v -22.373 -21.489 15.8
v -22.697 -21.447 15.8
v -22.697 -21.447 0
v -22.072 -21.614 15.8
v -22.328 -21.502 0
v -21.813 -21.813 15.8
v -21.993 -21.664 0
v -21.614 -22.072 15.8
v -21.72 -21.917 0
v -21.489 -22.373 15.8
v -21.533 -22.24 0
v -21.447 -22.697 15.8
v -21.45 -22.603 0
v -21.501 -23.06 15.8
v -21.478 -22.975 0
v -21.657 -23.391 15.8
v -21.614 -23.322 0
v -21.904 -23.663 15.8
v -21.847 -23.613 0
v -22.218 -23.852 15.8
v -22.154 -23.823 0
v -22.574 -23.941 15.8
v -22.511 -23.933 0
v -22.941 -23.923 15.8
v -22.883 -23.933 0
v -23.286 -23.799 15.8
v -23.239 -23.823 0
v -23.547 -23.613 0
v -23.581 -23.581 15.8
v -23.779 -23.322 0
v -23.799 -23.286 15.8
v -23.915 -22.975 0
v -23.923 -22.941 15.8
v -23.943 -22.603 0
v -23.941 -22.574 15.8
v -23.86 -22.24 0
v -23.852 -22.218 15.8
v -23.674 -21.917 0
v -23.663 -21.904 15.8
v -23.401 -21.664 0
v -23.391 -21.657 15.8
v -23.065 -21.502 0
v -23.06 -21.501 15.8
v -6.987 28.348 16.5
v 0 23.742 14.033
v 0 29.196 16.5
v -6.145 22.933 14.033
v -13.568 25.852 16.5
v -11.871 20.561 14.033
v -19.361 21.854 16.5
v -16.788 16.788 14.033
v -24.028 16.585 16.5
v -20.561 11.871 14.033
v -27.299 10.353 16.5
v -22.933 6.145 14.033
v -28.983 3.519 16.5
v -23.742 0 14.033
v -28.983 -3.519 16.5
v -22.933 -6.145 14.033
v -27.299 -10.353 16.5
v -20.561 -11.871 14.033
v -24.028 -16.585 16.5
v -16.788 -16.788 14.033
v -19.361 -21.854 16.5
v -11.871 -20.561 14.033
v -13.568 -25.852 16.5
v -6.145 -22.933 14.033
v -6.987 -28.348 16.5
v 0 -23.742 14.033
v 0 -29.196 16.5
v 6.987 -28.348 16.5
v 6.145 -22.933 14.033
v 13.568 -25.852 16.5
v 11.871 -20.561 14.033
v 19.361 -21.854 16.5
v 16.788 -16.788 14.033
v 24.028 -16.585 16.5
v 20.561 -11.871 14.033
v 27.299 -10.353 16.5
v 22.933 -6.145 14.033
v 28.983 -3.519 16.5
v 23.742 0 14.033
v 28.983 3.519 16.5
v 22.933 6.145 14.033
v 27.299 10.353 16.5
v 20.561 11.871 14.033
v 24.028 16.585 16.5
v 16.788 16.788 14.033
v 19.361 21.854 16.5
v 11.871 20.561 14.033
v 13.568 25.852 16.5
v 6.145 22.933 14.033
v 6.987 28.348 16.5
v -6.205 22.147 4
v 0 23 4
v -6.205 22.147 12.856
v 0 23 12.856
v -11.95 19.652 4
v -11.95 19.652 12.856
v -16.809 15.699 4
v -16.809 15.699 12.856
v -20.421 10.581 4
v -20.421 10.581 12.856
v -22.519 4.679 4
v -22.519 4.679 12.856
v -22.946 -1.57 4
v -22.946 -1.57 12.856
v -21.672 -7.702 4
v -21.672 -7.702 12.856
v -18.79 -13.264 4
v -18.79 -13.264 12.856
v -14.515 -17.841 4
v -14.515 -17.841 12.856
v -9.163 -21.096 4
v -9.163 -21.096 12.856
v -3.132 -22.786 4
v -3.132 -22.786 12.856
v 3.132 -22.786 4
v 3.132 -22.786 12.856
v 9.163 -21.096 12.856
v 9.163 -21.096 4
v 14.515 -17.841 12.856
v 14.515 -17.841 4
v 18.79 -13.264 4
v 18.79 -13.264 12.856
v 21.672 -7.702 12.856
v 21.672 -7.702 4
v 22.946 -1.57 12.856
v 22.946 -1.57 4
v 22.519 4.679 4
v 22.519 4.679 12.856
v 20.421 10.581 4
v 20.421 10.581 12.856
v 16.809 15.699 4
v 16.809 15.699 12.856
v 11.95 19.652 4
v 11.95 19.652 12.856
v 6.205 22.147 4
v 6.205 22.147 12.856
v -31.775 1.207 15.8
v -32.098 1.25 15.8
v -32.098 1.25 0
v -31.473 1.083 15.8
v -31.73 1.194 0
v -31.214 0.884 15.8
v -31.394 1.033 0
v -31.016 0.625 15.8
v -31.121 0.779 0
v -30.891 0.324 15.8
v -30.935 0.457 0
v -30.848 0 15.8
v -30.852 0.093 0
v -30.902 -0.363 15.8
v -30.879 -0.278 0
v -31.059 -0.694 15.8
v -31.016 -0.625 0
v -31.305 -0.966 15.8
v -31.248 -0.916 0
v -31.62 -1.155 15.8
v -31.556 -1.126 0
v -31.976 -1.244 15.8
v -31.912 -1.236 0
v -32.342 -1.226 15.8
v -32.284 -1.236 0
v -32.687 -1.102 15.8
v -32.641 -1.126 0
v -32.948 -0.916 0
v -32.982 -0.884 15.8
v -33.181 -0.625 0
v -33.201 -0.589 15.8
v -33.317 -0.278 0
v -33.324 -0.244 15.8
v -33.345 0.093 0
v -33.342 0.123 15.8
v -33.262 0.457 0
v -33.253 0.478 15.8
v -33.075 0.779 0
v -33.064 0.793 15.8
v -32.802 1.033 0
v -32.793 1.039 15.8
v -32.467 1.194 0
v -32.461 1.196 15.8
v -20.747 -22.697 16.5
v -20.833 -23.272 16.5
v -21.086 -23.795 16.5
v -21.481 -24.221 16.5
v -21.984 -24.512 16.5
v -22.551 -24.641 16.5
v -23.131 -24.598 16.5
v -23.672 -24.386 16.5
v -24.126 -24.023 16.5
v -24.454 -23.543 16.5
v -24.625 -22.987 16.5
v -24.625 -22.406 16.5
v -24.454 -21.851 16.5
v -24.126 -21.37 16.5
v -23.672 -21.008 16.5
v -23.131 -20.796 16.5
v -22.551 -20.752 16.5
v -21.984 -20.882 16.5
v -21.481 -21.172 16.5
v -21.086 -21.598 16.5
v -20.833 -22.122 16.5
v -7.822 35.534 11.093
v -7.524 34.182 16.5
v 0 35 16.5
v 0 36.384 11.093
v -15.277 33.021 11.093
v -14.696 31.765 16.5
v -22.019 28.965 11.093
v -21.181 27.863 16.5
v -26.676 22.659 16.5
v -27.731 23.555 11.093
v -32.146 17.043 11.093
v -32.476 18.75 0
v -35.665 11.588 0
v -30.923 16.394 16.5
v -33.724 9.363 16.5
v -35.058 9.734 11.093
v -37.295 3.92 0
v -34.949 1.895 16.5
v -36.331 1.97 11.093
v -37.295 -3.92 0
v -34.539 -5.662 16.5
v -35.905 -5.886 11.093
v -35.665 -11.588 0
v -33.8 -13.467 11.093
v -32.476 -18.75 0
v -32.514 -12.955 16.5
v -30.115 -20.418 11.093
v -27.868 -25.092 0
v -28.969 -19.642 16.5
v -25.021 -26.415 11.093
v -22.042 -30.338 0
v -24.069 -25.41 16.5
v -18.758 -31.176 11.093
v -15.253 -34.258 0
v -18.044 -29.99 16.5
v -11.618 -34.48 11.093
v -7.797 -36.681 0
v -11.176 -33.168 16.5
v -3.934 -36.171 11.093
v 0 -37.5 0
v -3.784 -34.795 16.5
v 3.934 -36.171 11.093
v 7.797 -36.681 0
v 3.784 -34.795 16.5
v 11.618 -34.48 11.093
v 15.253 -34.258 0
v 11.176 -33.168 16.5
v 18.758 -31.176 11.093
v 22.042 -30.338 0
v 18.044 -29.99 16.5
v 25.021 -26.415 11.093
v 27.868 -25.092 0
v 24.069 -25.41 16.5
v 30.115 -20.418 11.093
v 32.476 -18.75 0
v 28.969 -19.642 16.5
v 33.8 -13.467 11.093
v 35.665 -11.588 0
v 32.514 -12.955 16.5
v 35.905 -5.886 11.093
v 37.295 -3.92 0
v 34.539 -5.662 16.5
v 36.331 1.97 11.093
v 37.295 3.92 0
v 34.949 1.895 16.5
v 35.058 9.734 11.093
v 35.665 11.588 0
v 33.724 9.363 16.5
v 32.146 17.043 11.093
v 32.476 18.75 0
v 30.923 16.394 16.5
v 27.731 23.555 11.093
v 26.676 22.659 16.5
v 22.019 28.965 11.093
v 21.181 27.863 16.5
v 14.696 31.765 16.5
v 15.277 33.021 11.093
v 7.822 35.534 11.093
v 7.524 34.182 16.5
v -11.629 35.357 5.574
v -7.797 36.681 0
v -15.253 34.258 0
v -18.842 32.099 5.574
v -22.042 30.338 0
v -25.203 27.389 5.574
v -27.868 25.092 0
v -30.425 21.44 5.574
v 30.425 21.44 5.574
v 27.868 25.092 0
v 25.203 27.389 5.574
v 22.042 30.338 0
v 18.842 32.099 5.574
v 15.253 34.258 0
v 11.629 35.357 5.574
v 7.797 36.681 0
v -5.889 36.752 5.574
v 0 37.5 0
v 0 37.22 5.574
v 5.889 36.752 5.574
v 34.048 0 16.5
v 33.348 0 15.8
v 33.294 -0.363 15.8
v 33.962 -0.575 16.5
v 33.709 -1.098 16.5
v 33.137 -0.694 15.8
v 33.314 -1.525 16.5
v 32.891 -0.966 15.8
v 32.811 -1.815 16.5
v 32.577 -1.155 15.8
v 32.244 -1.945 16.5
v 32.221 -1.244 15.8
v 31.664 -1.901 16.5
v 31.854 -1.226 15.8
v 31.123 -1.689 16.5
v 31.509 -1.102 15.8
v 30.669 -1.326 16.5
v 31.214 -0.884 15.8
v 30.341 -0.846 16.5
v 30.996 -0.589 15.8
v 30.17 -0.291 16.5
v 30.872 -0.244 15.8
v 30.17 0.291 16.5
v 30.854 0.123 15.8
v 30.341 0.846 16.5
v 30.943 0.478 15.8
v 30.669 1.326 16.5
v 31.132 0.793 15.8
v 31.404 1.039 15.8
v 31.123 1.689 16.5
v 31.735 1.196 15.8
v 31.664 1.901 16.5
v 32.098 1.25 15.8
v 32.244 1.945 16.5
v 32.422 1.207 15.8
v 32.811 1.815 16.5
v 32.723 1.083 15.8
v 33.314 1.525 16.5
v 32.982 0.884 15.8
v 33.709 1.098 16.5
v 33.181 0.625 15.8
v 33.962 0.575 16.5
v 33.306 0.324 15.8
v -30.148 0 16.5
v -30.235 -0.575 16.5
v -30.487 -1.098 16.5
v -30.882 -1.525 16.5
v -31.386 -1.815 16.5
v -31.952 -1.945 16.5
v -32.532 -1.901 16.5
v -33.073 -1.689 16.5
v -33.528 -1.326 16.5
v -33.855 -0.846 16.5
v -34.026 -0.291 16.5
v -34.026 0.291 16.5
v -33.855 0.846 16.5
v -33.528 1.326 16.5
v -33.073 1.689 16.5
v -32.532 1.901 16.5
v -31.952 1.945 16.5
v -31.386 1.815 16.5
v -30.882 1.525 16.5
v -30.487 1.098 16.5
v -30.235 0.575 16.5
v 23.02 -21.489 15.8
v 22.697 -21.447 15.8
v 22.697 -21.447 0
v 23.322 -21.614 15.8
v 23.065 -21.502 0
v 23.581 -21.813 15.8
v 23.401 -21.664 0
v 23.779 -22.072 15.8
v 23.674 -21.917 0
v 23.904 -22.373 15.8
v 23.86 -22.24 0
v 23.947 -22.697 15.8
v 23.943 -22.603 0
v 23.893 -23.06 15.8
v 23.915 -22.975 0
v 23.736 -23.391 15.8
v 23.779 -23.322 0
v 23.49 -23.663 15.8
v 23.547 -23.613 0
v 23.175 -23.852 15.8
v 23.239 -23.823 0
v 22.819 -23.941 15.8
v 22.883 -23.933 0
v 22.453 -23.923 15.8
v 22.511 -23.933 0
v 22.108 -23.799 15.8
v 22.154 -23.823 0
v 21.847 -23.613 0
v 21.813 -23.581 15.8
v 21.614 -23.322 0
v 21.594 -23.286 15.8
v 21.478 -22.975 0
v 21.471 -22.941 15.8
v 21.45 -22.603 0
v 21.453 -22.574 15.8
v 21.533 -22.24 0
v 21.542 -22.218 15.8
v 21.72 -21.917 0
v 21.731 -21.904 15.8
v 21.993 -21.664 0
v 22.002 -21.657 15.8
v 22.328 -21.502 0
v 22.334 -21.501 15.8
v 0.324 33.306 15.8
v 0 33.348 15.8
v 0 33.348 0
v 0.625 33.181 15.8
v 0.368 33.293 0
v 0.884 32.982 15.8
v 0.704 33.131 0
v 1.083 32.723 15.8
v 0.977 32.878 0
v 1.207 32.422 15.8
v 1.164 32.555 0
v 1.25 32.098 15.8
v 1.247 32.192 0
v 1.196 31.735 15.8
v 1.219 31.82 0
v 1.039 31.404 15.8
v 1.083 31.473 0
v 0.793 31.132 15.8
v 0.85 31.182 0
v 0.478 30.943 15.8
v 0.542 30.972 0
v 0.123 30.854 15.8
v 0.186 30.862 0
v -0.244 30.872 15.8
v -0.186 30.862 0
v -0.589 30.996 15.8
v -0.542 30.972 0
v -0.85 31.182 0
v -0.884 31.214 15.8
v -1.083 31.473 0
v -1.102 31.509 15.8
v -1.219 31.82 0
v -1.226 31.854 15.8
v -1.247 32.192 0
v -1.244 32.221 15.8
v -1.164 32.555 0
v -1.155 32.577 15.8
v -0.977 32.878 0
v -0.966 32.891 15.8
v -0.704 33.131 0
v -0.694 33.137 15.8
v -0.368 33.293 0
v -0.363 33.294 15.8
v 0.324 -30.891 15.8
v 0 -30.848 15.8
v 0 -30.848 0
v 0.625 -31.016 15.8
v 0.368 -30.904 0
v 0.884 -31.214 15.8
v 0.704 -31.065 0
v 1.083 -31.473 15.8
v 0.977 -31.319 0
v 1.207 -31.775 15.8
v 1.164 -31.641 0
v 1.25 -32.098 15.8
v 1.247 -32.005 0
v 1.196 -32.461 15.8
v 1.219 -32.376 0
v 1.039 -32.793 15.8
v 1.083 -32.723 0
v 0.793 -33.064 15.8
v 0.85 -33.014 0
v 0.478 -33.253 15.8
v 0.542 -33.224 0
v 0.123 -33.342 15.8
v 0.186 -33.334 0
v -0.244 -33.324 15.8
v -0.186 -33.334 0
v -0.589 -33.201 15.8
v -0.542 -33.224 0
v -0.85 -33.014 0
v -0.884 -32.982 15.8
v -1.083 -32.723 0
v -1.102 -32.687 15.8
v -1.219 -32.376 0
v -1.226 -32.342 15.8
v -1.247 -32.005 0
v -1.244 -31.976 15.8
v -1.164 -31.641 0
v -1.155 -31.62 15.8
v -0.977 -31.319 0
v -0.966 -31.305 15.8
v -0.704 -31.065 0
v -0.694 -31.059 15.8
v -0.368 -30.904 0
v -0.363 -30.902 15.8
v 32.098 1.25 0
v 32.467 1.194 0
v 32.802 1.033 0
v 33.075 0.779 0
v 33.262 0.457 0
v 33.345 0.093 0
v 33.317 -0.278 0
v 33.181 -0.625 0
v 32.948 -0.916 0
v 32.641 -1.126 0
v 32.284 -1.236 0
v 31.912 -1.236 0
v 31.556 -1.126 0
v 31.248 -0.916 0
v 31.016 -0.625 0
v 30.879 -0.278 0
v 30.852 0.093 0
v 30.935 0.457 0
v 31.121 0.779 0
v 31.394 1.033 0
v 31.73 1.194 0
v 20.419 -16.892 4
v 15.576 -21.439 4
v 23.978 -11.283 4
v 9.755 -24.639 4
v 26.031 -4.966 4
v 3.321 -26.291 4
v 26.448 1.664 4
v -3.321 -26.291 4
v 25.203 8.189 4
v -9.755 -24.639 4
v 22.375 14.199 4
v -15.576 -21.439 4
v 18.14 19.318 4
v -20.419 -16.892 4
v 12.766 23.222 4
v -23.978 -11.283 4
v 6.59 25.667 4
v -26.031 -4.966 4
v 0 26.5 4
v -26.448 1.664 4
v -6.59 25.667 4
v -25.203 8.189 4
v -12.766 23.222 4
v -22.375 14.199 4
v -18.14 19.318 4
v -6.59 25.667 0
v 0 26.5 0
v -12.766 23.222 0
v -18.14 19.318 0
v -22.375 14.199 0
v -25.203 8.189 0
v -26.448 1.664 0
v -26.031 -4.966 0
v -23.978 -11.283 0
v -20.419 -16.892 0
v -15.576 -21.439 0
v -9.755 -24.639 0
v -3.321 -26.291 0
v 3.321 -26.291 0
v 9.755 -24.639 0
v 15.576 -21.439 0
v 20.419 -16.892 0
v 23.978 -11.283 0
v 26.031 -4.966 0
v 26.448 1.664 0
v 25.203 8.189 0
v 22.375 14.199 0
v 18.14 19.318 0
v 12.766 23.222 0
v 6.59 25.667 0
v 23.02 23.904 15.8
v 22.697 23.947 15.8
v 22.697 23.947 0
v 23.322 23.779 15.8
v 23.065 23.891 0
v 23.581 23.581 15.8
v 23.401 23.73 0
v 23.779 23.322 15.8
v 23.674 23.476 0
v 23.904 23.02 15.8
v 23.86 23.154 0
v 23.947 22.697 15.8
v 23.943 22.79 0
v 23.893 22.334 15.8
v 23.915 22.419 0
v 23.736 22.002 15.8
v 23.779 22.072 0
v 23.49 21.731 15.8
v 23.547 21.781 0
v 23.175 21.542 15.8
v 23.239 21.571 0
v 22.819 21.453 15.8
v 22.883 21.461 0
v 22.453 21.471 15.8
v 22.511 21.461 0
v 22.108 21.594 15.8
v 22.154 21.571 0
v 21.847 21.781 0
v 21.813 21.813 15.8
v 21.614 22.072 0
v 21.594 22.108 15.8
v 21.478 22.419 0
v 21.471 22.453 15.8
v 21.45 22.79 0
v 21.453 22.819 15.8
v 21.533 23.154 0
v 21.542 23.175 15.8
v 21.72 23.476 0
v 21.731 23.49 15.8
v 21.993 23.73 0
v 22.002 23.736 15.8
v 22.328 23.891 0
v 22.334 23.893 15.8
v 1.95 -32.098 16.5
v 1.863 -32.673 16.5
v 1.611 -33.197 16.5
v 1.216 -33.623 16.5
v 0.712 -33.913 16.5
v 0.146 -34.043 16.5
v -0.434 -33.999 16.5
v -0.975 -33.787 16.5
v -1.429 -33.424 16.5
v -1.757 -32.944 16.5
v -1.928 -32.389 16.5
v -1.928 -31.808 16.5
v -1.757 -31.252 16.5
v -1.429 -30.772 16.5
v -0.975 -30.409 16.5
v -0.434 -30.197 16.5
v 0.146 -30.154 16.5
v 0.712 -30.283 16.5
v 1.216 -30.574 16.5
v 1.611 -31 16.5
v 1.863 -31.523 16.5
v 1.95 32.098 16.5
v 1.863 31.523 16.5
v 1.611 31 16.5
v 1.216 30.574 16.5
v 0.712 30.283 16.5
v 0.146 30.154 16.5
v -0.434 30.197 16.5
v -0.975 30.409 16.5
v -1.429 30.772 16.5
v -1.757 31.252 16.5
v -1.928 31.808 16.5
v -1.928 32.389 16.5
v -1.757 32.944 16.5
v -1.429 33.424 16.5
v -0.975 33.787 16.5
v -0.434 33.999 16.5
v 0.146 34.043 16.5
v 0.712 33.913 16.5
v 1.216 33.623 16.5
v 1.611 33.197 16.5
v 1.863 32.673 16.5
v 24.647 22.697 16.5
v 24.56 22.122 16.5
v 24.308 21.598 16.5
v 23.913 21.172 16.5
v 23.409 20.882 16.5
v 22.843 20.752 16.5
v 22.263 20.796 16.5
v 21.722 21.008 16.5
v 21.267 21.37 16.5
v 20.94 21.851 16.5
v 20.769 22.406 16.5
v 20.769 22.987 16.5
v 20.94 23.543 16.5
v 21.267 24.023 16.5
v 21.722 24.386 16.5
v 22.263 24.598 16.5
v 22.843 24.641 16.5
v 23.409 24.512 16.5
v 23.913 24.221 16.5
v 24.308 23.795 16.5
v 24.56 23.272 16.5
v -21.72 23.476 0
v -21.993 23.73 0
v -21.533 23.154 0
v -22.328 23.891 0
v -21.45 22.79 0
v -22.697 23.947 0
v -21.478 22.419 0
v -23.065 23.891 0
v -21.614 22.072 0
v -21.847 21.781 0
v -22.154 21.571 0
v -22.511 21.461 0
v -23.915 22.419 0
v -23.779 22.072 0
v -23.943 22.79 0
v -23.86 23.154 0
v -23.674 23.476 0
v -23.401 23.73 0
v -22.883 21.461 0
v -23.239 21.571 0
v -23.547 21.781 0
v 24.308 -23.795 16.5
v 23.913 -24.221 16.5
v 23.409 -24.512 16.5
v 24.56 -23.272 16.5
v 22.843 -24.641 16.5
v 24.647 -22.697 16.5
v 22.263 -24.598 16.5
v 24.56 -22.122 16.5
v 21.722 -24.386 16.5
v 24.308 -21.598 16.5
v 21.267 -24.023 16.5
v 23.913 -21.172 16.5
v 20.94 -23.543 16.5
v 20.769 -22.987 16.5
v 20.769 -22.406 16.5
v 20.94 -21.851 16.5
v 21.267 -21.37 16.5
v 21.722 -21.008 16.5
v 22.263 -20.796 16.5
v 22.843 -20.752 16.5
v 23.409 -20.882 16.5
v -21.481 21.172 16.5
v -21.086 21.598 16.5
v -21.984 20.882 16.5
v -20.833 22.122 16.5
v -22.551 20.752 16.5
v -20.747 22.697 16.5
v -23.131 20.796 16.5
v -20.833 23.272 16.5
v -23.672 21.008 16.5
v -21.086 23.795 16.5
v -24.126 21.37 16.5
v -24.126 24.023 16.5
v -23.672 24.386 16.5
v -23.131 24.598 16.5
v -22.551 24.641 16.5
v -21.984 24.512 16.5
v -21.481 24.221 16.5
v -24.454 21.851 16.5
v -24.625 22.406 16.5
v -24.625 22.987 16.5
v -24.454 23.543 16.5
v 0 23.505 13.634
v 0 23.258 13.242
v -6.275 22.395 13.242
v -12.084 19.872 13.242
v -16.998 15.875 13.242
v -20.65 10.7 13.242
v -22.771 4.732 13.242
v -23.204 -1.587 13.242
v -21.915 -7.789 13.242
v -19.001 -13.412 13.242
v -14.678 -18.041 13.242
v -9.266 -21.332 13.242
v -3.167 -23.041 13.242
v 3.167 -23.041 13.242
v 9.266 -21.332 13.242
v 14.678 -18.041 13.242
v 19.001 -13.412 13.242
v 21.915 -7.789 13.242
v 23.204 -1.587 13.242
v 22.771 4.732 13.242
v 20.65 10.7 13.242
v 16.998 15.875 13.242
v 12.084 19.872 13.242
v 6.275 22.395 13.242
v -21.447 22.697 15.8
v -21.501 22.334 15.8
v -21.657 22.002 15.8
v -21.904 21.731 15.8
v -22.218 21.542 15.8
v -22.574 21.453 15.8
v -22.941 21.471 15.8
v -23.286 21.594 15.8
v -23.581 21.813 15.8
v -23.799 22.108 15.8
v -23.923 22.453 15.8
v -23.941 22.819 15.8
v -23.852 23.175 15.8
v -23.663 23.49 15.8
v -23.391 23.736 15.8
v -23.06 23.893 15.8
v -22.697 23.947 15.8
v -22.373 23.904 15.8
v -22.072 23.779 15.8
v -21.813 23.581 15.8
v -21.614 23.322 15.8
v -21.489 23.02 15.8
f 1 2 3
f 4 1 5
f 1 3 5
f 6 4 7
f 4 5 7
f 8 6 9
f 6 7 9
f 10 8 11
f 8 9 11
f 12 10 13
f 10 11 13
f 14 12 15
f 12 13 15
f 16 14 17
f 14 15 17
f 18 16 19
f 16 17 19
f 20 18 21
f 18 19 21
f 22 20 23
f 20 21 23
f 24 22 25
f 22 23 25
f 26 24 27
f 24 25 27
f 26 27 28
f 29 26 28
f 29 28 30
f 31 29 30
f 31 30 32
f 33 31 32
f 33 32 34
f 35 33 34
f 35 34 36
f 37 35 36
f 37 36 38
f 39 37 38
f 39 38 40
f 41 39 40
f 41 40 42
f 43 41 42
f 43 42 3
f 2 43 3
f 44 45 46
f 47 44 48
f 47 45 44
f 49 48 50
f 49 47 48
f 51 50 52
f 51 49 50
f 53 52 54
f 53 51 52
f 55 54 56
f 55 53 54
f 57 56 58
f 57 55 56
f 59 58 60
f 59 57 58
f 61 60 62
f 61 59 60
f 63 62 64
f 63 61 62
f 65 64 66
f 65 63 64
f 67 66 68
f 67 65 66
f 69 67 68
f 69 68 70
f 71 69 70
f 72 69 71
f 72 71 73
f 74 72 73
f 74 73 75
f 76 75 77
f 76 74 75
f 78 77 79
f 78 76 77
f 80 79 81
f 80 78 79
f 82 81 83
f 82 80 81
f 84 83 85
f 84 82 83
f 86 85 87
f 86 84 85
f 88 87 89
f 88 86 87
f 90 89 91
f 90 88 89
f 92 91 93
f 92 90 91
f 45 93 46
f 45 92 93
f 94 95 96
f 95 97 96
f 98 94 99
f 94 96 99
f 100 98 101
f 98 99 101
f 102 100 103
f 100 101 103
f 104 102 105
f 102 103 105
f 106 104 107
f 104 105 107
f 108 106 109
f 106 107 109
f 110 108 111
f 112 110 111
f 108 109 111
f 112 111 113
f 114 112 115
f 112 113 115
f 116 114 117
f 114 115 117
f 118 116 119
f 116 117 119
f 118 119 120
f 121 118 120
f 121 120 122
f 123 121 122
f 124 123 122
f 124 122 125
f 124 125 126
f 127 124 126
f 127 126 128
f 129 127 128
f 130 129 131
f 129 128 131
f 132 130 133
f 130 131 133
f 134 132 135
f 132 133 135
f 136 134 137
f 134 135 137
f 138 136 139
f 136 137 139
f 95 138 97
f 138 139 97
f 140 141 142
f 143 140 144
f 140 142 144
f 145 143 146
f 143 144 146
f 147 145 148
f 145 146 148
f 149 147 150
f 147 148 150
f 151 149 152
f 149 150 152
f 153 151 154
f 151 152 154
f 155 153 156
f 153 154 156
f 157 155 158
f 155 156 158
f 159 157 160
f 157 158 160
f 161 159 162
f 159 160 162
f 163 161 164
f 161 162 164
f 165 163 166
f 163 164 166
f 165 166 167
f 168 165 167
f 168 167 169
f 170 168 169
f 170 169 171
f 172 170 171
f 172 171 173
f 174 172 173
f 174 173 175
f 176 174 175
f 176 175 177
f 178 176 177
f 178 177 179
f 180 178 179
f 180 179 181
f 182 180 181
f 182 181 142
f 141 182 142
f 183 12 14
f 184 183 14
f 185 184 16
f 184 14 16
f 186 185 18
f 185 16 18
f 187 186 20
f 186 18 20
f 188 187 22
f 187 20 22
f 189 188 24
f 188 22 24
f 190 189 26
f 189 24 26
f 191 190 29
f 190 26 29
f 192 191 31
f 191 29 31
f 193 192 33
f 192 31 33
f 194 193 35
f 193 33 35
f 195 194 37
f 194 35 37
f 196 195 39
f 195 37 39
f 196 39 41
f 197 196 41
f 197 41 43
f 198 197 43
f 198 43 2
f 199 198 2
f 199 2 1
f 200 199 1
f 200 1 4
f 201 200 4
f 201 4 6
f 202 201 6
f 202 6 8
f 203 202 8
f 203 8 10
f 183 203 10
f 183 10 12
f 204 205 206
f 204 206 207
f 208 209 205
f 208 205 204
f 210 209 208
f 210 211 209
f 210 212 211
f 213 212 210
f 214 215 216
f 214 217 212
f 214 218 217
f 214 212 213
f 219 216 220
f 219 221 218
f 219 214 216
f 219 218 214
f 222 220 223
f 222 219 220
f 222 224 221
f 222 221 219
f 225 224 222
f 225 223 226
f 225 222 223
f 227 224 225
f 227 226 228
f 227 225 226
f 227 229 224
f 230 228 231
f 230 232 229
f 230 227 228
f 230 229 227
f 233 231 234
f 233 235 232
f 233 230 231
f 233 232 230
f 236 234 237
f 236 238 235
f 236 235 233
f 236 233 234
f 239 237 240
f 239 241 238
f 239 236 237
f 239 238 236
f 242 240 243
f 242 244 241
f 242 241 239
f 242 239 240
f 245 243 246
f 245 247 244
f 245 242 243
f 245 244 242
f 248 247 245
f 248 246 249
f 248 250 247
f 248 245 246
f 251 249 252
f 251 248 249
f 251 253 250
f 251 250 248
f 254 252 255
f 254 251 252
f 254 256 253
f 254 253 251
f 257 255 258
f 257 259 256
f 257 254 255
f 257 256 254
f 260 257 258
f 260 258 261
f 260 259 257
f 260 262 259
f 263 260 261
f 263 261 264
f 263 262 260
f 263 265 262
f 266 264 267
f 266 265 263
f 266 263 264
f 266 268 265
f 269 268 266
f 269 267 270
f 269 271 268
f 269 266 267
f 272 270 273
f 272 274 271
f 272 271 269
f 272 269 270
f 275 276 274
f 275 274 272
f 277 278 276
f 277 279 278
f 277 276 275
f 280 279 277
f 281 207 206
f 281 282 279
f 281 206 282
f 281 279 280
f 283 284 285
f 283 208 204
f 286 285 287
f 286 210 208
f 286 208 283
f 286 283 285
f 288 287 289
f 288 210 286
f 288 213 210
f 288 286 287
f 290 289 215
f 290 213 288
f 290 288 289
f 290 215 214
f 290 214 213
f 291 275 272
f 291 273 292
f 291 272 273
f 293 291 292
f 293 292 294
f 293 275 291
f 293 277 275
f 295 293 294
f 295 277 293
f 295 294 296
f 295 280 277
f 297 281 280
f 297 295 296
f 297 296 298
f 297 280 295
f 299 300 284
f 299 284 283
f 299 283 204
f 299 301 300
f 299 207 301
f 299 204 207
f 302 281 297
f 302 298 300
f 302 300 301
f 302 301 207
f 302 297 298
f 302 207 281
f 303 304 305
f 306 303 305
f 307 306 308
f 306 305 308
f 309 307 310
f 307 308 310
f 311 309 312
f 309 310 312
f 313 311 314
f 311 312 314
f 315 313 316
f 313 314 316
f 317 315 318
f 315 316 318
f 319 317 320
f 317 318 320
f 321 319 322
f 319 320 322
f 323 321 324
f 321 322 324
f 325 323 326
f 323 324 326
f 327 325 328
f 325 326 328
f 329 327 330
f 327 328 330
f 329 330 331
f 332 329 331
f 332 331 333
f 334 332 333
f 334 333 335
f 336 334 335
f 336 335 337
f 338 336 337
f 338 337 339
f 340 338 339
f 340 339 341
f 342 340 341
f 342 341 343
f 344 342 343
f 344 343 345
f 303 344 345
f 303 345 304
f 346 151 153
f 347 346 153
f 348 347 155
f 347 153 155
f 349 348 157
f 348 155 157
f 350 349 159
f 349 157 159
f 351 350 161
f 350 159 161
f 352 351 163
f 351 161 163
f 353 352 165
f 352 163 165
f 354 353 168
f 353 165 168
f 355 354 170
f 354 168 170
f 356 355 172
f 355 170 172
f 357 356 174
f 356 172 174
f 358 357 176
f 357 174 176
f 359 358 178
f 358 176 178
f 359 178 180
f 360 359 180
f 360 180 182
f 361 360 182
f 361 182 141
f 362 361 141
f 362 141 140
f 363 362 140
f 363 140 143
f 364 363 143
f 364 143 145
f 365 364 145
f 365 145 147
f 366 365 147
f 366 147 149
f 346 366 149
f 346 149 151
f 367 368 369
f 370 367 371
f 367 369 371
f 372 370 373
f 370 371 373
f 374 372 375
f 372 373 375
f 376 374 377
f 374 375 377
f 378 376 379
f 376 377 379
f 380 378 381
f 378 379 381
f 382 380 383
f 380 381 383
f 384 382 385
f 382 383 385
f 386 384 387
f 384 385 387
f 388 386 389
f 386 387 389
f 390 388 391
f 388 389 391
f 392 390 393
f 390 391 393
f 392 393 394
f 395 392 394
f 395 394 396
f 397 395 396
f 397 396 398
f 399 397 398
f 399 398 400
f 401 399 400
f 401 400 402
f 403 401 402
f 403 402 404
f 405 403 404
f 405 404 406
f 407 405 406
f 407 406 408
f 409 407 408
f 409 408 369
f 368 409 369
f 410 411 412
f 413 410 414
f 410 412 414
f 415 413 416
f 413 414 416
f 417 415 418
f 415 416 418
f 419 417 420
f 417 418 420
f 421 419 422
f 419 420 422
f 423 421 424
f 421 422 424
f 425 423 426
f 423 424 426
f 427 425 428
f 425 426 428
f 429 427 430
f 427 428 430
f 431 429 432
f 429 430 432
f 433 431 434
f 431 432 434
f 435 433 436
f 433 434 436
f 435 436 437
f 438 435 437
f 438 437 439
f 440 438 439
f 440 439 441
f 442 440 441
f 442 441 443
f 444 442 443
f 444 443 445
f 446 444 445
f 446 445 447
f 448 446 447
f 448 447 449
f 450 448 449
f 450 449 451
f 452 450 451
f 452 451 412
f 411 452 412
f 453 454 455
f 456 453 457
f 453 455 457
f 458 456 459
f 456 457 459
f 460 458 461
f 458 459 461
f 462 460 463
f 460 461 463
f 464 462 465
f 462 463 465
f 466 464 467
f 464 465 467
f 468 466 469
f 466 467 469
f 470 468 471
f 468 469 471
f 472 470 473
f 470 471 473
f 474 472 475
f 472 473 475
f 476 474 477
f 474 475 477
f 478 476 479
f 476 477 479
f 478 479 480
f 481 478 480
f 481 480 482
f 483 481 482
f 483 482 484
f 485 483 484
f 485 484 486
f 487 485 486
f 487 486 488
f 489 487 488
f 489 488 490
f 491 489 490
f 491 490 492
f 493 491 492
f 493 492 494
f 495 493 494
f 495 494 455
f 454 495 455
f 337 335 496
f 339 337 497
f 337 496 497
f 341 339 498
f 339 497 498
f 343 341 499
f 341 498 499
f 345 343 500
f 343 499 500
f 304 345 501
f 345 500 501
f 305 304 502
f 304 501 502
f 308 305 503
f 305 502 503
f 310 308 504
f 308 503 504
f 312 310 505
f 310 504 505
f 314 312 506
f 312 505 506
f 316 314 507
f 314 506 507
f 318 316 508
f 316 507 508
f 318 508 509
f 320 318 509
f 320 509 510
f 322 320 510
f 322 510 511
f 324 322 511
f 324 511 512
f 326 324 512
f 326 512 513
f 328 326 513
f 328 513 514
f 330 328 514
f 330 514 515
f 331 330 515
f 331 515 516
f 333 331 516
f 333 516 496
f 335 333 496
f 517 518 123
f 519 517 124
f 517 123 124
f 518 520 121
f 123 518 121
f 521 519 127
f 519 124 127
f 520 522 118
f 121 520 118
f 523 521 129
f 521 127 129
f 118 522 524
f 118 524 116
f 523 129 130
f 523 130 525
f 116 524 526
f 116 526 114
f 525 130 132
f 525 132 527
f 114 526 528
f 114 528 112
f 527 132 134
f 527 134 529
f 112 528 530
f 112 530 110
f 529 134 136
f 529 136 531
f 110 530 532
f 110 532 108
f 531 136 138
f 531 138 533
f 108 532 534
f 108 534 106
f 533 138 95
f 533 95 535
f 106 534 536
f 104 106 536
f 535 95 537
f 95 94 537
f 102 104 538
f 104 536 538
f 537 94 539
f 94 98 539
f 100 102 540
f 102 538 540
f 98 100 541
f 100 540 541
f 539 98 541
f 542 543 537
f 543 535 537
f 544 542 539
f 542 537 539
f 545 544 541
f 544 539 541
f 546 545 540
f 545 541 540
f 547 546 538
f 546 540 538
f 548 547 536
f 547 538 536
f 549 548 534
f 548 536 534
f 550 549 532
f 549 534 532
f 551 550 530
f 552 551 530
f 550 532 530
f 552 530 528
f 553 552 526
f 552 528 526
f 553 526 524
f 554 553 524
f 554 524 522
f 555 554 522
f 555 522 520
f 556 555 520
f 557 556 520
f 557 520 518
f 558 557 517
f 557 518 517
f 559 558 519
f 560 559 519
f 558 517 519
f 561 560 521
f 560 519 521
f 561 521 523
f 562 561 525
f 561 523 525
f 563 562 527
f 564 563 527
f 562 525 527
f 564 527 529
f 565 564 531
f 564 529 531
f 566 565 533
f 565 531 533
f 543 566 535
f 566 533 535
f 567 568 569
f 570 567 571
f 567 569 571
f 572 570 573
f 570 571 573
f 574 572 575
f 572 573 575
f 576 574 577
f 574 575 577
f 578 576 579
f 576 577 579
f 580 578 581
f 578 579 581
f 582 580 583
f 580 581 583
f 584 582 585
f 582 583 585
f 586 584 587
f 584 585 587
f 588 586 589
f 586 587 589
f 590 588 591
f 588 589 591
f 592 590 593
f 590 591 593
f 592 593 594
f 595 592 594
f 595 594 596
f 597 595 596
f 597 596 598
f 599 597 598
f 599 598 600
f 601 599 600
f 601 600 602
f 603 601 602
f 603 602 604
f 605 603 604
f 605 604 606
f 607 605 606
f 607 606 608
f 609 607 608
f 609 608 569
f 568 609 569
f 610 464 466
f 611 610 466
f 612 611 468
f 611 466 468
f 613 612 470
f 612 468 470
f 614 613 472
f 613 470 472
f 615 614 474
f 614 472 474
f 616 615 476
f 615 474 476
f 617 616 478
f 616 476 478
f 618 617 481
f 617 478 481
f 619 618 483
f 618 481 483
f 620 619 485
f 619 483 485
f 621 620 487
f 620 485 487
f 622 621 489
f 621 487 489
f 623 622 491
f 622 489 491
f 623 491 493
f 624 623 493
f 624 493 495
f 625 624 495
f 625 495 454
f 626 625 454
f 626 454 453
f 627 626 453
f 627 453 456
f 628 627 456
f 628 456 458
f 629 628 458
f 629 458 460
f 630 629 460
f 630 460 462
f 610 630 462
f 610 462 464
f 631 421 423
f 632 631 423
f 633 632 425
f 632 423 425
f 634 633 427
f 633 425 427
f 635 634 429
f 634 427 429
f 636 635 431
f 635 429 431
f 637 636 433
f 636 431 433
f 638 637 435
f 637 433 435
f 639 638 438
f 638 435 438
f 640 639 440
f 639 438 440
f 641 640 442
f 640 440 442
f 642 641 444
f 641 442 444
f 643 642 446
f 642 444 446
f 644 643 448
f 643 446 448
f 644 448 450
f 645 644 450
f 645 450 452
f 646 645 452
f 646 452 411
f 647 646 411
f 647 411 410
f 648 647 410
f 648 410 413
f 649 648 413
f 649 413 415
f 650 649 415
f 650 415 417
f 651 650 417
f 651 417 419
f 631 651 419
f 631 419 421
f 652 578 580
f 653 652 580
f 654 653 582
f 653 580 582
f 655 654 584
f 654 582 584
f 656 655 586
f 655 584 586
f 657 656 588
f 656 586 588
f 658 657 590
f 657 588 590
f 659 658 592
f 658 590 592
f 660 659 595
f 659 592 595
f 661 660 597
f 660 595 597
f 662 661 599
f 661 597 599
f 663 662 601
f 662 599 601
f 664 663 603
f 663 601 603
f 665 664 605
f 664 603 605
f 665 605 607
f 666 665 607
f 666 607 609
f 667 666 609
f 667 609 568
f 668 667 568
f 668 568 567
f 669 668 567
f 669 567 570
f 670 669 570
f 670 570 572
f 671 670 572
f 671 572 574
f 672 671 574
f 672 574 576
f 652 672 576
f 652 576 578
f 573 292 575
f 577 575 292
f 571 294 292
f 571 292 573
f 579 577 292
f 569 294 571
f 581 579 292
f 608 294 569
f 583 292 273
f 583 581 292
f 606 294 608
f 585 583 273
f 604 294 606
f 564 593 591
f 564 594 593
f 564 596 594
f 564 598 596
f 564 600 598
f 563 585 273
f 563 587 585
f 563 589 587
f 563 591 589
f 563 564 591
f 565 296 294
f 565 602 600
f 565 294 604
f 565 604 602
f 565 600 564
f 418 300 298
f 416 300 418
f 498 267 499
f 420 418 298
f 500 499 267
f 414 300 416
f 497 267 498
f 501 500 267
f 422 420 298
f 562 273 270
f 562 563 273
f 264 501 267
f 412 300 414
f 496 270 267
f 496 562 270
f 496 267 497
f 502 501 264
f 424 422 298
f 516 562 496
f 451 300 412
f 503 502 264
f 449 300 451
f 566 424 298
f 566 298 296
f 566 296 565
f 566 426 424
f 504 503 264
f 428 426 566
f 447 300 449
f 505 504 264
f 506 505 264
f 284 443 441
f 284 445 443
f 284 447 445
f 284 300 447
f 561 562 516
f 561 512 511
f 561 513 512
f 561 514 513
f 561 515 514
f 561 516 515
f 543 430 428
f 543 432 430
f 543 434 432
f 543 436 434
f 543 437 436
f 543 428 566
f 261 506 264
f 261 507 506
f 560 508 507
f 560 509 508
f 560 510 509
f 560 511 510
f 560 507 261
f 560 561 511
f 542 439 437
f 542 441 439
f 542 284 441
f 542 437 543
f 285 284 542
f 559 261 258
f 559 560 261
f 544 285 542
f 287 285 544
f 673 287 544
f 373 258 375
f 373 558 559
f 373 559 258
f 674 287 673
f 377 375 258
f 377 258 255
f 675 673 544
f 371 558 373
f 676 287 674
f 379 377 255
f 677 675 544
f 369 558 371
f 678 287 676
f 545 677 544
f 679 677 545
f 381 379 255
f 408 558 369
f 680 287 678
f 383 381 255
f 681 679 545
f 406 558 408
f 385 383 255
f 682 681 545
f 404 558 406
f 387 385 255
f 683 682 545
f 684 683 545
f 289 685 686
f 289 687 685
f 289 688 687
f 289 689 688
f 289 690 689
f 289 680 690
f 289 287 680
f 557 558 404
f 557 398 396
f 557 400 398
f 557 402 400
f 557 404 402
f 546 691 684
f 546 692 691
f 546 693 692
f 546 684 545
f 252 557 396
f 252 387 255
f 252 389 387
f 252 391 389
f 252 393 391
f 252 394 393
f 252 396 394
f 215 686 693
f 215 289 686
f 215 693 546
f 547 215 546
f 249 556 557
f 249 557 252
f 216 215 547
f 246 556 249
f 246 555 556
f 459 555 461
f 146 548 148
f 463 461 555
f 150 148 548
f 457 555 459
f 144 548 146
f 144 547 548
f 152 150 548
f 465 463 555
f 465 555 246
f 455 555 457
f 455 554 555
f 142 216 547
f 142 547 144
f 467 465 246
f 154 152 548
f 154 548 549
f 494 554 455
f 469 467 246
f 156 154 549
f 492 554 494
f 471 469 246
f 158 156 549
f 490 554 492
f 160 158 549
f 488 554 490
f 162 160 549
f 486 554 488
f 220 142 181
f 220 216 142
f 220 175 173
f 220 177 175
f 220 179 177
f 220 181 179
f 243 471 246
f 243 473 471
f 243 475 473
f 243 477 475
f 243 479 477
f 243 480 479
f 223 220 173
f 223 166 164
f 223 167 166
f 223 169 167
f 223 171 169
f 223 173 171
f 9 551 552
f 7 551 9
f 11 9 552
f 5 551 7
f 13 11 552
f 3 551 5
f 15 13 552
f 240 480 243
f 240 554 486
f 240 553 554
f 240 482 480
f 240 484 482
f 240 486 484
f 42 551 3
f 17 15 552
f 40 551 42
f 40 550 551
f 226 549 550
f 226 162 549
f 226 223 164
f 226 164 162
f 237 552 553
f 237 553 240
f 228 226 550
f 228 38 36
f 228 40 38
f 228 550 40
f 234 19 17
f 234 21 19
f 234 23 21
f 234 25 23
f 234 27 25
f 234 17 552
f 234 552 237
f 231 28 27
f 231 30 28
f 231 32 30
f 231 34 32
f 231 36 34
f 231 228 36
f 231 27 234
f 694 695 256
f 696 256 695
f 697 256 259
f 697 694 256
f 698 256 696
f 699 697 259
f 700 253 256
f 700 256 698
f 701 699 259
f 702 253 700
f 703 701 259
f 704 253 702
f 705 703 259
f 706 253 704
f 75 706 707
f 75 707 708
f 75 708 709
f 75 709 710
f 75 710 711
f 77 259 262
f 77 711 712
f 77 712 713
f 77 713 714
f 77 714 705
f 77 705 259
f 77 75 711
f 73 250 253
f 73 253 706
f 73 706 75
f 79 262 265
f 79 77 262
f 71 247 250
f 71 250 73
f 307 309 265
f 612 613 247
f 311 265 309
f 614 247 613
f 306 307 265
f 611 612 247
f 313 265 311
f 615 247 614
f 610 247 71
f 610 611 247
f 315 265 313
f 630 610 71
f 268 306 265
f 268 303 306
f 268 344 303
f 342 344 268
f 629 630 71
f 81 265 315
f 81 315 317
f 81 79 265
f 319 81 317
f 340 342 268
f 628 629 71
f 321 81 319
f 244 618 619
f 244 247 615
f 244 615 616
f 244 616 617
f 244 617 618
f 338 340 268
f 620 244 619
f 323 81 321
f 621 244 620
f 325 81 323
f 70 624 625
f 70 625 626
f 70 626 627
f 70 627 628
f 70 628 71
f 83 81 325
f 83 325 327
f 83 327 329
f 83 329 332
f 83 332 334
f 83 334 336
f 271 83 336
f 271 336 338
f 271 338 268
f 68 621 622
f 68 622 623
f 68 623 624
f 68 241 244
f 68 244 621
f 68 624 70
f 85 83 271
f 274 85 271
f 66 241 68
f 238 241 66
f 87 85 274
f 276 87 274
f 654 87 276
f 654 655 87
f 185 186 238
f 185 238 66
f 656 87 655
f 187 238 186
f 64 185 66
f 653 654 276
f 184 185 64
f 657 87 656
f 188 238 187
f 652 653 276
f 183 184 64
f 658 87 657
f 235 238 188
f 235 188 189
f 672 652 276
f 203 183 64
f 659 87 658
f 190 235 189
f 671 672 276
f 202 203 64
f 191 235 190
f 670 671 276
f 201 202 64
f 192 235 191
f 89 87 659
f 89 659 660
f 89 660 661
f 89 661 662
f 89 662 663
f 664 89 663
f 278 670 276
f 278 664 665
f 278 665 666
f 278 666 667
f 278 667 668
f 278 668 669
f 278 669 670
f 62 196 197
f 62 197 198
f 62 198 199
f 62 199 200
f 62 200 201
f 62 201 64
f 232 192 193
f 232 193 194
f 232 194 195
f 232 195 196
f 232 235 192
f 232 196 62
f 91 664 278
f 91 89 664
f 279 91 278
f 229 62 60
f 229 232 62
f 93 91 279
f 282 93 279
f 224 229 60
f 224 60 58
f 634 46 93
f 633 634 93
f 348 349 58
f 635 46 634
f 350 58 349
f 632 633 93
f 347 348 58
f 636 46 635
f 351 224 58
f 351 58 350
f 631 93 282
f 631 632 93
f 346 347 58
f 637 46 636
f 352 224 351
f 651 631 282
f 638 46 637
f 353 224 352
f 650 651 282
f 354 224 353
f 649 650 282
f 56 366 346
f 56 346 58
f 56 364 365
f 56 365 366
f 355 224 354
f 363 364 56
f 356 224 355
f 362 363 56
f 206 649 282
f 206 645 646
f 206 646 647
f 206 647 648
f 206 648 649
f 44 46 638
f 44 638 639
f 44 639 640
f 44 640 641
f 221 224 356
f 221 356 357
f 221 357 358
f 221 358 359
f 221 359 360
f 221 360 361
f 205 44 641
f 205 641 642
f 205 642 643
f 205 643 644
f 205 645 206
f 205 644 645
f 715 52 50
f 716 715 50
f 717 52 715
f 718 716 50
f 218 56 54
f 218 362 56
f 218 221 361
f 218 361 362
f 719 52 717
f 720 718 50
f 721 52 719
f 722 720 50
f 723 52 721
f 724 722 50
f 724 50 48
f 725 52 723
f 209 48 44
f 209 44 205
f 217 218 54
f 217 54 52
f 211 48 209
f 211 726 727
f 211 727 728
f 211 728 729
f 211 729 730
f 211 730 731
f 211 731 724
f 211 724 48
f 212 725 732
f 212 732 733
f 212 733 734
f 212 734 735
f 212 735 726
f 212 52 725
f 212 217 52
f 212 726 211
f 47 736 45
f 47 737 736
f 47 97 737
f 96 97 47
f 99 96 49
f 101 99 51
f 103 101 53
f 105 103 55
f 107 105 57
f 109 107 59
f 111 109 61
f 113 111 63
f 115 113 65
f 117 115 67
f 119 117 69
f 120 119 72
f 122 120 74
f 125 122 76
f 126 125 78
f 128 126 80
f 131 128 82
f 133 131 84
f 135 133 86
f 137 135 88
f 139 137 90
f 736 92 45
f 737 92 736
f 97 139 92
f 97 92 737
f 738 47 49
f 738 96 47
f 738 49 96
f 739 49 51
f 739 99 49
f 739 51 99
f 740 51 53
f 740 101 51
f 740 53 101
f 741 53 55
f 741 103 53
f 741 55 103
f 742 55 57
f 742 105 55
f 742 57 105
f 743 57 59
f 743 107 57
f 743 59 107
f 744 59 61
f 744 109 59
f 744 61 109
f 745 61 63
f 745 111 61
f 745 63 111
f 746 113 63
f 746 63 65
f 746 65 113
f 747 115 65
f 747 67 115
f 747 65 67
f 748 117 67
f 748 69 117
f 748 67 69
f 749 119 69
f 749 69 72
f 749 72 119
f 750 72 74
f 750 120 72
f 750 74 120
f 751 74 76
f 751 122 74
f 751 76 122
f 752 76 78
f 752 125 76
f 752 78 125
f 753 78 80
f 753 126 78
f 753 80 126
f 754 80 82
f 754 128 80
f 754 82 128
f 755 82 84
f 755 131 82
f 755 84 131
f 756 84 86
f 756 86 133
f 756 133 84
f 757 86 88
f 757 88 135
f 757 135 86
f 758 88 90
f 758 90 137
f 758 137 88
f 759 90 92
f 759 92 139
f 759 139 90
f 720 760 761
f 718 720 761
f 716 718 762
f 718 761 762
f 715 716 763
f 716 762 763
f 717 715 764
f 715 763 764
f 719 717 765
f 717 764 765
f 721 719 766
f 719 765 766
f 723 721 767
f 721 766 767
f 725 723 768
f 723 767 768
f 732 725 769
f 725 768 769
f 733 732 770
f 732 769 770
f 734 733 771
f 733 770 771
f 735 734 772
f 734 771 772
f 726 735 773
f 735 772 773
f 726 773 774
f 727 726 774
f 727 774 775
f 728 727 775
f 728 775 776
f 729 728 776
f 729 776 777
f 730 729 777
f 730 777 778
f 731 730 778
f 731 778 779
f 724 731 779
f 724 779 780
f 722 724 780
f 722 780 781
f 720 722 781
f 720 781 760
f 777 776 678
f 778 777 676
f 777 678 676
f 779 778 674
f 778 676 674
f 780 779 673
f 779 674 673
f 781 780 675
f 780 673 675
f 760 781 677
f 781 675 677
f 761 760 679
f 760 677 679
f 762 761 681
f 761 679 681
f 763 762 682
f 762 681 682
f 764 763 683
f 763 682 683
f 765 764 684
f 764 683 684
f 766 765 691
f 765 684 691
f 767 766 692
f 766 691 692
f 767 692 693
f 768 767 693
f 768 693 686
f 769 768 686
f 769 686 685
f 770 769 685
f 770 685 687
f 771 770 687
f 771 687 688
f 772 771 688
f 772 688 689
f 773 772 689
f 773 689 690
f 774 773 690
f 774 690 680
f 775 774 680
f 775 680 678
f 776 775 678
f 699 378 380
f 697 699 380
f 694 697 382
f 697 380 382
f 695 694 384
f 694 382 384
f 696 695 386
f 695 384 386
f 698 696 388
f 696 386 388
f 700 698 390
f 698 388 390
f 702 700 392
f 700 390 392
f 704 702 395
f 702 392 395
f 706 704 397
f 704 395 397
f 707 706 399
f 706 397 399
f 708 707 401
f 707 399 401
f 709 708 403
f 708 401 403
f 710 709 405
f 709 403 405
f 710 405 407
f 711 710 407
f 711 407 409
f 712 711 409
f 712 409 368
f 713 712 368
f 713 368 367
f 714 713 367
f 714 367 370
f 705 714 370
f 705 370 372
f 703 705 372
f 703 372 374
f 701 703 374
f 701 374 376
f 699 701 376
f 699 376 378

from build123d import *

# Parameters (mm, degrees)
FASE1_SIZE                                           = 4.290340475
SKIZZE11_R                                           = 22.5
SCHNITT_LINEAR_AUSTRAGEN3_DEPTH                      = 56.540525909
FORMSENKUNG_F_R_M3_SENKSCHRAUBE_MIT_INNE_D           = 1.6
FORMSENKUNG_F_R_M3_SENKSCHRAUBE_MIT_INNE_DEPTH       = 22
FORMSENKUNG_F_R_M3_SENKSCHRAUBE_MIT_INNE_CSINK_D     = 3.9
FORMSENKUNG_F_R_M3_SENKSCHRAUBE_MIT_INNE_CSINK_ANGLE = 90
FORMSENKUNG_F_R_M3_SENKSCHRAUBE_MIT_INNE_TIP         = 0.480688495
SKIZZE10_R                                           = 1.25
SCHNITT_LINEAR_AUSTRAGEN2_DEPTH                      = 56.540525909


with BuildPart() as part:
    # Skizze1 → Rotation (revolve)
    with BuildSketch(Plane(origin=(0, 0, 0), x_dir=(0, 0, -1), z_dir=(1, 0, 0))):
        with BuildLine():
            Line((0, 26), (0, 37.5))
            ThreePointArc((0, 37.5), (-8.344159634, 36.871453585), (-16.5, 35))
            Line((-16.5, 35), (-16.5, 24.905973721))
            ThreePointArc((-16.5, 24.905973721), (-12.407631733, 22.680062235), (-9.073139558, 19.426860442))
            Line((-9.073139558, 19.426860442), (-6, 22.5))
            Line((-6, 22.5), (-4, 22.5))
            Line((-4, 22.5), (-4, 26))
            Line((-4, 26), (0, 26))
        make_face()
    revolve(axis=Axis((0, 0, -11.01172812), (0, 0, 1)))

    # Fase1
    # the kernel refuses this chamfer: 4.290340475, 2.5 mm, written as the material it takes off along each edge
    with BuildSketch(Plane(origin=(0, 0, 16.5), x_dir=(0, 1, 0), z_dir=(1, 0, 0))) as fase1_piece_1:
        with BuildLine():
            Line((24.905973721 + FASE1_SIZE, 0), (23.741652955, -2.466620822))
            ThreePointArc((23.741652955, -2.466620822), (24.345172312, -1.316125117), (24.905973721, 0))
            Line((24.905973721, 0), (24.905973721 + FASE1_SIZE, 0))
        make_face()
    revolve(axis=Axis((0, 0, 16.5), (0, 0, 1)), mode=Mode.SUBTRACT)

    # Skizze11 → Schnitt-Linear austragen3 (cut, through all)
    with BuildSketch(Plane(origin=(0, 0, 0), x_dir=(-1, 0, 0), z_dir=(0, 0, -1))):
        with Locations(Location((0, 0, 0), (0, 0, 90))):
            Circle(SKIZZE11_R)
    extrude(amount=-SCHNITT_LINEAR_AUSTRAGEN3_DEPTH, mode=Mode.SUBTRACT)

    # Skizze5 → Druck-Toleranz I (revolve, cut)
    with BuildSketch(Plane(origin=(0, 0, 0), x_dir=(0, 0, -1), z_dir=(1, 0, 0))):
        Polygon((-4, 23), (-12.856349239, 23), (-12.856349239, 0), (0, 0), (0, 26.5), (-4, 26.5), align=None)
    revolve(axis=Axis((0, 0, -11.01172812), (0, 0, 1)), mode=Mode.SUBTRACT)

    # Formsenkung f_r M3 Senkschraube mit Inne
    with Locations(Plane(origin=(0, 0, 16.5), x_dir=(-1, 0, 0), z_dir=(0, 0, 1))):
        with Locations((0, 32.098157098), (22.696824548, 22.696824548), (32.098157098, 0), (22.696824548, -22.696824548), (0, -32.098157098), (-22.696824548, -22.696824548), (-32.098157098, 0), (-22.696824548, 22.696824548)):
            CounterSinkHole(FORMSENKUNG_F_R_M3_SENKSCHRAUBE_MIT_INNE_D / 2, FORMSENKUNG_F_R_M3_SENKSCHRAUBE_MIT_INNE_CSINK_D / 2, depth=FORMSENKUNG_F_R_M3_SENKSCHRAUBE_MIT_INNE_DEPTH, counter_sink_angle=FORMSENKUNG_F_R_M3_SENKSCHRAUBE_MIT_INNE_CSINK_ANGLE)
            with Locations((0, 0, -(FORMSENKUNG_F_R_M3_SENKSCHRAUBE_MIT_INNE_DEPTH + FORMSENKUNG_F_R_M3_SENKSCHRAUBE_MIT_INNE_TIP / 2))):  # 118° drill point
                Cone(0, FORMSENKUNG_F_R_M3_SENKSCHRAUBE_MIT_INNE_D / 2, FORMSENKUNG_F_R_M3_SENKSCHRAUBE_MIT_INNE_TIP, mode=Mode.SUBTRACT)

    # Skizze10 → Schnitt-Linear austragen2 (cut, through all)
    with BuildSketch(Plane(origin=(0, 0, 0), x_dir=(-1, 0, 0), z_dir=(0, 0, -1))):
        with Locations(Location((0, 32.098157098, 0), (0, 0, 90))):
            Circle(SKIZZE10_R)
        with Locations(Location((22.696824548, 22.696824548, 0), (0, 0, 90))):
            Circle(SKIZZE10_R)
        with Locations(Location((32.098157098, 0, 0), (0, 0, 90))):
            Circle(SKIZZE10_R)
        with Locations(Location((-22.696824548, 22.696824548, 0), (0, 0, 90))):
            Circle(SKIZZE10_R)
        with Locations(Location((-32.098157098, 0, 0), (0, 0, 90))):
            Circle(SKIZZE10_R)
        with Locations(Location((-22.696824548, -22.696824548, 0), (0, 0, 90))):
            Circle(SKIZZE10_R)
        with Locations(Location((0, -32.098157098, 0), (0, 0, 90))):
            Circle(SKIZZE10_R)
        with Locations(Location((22.696824548, -22.696824548, 0), (0, 0, 90))):
            Circle(SKIZZE10_R)
    extrude(amount=-SCHNITT_LINEAR_AUSTRAGEN2_DEPTH, mode=Mode.SUBTRACT)


solid = part.part
